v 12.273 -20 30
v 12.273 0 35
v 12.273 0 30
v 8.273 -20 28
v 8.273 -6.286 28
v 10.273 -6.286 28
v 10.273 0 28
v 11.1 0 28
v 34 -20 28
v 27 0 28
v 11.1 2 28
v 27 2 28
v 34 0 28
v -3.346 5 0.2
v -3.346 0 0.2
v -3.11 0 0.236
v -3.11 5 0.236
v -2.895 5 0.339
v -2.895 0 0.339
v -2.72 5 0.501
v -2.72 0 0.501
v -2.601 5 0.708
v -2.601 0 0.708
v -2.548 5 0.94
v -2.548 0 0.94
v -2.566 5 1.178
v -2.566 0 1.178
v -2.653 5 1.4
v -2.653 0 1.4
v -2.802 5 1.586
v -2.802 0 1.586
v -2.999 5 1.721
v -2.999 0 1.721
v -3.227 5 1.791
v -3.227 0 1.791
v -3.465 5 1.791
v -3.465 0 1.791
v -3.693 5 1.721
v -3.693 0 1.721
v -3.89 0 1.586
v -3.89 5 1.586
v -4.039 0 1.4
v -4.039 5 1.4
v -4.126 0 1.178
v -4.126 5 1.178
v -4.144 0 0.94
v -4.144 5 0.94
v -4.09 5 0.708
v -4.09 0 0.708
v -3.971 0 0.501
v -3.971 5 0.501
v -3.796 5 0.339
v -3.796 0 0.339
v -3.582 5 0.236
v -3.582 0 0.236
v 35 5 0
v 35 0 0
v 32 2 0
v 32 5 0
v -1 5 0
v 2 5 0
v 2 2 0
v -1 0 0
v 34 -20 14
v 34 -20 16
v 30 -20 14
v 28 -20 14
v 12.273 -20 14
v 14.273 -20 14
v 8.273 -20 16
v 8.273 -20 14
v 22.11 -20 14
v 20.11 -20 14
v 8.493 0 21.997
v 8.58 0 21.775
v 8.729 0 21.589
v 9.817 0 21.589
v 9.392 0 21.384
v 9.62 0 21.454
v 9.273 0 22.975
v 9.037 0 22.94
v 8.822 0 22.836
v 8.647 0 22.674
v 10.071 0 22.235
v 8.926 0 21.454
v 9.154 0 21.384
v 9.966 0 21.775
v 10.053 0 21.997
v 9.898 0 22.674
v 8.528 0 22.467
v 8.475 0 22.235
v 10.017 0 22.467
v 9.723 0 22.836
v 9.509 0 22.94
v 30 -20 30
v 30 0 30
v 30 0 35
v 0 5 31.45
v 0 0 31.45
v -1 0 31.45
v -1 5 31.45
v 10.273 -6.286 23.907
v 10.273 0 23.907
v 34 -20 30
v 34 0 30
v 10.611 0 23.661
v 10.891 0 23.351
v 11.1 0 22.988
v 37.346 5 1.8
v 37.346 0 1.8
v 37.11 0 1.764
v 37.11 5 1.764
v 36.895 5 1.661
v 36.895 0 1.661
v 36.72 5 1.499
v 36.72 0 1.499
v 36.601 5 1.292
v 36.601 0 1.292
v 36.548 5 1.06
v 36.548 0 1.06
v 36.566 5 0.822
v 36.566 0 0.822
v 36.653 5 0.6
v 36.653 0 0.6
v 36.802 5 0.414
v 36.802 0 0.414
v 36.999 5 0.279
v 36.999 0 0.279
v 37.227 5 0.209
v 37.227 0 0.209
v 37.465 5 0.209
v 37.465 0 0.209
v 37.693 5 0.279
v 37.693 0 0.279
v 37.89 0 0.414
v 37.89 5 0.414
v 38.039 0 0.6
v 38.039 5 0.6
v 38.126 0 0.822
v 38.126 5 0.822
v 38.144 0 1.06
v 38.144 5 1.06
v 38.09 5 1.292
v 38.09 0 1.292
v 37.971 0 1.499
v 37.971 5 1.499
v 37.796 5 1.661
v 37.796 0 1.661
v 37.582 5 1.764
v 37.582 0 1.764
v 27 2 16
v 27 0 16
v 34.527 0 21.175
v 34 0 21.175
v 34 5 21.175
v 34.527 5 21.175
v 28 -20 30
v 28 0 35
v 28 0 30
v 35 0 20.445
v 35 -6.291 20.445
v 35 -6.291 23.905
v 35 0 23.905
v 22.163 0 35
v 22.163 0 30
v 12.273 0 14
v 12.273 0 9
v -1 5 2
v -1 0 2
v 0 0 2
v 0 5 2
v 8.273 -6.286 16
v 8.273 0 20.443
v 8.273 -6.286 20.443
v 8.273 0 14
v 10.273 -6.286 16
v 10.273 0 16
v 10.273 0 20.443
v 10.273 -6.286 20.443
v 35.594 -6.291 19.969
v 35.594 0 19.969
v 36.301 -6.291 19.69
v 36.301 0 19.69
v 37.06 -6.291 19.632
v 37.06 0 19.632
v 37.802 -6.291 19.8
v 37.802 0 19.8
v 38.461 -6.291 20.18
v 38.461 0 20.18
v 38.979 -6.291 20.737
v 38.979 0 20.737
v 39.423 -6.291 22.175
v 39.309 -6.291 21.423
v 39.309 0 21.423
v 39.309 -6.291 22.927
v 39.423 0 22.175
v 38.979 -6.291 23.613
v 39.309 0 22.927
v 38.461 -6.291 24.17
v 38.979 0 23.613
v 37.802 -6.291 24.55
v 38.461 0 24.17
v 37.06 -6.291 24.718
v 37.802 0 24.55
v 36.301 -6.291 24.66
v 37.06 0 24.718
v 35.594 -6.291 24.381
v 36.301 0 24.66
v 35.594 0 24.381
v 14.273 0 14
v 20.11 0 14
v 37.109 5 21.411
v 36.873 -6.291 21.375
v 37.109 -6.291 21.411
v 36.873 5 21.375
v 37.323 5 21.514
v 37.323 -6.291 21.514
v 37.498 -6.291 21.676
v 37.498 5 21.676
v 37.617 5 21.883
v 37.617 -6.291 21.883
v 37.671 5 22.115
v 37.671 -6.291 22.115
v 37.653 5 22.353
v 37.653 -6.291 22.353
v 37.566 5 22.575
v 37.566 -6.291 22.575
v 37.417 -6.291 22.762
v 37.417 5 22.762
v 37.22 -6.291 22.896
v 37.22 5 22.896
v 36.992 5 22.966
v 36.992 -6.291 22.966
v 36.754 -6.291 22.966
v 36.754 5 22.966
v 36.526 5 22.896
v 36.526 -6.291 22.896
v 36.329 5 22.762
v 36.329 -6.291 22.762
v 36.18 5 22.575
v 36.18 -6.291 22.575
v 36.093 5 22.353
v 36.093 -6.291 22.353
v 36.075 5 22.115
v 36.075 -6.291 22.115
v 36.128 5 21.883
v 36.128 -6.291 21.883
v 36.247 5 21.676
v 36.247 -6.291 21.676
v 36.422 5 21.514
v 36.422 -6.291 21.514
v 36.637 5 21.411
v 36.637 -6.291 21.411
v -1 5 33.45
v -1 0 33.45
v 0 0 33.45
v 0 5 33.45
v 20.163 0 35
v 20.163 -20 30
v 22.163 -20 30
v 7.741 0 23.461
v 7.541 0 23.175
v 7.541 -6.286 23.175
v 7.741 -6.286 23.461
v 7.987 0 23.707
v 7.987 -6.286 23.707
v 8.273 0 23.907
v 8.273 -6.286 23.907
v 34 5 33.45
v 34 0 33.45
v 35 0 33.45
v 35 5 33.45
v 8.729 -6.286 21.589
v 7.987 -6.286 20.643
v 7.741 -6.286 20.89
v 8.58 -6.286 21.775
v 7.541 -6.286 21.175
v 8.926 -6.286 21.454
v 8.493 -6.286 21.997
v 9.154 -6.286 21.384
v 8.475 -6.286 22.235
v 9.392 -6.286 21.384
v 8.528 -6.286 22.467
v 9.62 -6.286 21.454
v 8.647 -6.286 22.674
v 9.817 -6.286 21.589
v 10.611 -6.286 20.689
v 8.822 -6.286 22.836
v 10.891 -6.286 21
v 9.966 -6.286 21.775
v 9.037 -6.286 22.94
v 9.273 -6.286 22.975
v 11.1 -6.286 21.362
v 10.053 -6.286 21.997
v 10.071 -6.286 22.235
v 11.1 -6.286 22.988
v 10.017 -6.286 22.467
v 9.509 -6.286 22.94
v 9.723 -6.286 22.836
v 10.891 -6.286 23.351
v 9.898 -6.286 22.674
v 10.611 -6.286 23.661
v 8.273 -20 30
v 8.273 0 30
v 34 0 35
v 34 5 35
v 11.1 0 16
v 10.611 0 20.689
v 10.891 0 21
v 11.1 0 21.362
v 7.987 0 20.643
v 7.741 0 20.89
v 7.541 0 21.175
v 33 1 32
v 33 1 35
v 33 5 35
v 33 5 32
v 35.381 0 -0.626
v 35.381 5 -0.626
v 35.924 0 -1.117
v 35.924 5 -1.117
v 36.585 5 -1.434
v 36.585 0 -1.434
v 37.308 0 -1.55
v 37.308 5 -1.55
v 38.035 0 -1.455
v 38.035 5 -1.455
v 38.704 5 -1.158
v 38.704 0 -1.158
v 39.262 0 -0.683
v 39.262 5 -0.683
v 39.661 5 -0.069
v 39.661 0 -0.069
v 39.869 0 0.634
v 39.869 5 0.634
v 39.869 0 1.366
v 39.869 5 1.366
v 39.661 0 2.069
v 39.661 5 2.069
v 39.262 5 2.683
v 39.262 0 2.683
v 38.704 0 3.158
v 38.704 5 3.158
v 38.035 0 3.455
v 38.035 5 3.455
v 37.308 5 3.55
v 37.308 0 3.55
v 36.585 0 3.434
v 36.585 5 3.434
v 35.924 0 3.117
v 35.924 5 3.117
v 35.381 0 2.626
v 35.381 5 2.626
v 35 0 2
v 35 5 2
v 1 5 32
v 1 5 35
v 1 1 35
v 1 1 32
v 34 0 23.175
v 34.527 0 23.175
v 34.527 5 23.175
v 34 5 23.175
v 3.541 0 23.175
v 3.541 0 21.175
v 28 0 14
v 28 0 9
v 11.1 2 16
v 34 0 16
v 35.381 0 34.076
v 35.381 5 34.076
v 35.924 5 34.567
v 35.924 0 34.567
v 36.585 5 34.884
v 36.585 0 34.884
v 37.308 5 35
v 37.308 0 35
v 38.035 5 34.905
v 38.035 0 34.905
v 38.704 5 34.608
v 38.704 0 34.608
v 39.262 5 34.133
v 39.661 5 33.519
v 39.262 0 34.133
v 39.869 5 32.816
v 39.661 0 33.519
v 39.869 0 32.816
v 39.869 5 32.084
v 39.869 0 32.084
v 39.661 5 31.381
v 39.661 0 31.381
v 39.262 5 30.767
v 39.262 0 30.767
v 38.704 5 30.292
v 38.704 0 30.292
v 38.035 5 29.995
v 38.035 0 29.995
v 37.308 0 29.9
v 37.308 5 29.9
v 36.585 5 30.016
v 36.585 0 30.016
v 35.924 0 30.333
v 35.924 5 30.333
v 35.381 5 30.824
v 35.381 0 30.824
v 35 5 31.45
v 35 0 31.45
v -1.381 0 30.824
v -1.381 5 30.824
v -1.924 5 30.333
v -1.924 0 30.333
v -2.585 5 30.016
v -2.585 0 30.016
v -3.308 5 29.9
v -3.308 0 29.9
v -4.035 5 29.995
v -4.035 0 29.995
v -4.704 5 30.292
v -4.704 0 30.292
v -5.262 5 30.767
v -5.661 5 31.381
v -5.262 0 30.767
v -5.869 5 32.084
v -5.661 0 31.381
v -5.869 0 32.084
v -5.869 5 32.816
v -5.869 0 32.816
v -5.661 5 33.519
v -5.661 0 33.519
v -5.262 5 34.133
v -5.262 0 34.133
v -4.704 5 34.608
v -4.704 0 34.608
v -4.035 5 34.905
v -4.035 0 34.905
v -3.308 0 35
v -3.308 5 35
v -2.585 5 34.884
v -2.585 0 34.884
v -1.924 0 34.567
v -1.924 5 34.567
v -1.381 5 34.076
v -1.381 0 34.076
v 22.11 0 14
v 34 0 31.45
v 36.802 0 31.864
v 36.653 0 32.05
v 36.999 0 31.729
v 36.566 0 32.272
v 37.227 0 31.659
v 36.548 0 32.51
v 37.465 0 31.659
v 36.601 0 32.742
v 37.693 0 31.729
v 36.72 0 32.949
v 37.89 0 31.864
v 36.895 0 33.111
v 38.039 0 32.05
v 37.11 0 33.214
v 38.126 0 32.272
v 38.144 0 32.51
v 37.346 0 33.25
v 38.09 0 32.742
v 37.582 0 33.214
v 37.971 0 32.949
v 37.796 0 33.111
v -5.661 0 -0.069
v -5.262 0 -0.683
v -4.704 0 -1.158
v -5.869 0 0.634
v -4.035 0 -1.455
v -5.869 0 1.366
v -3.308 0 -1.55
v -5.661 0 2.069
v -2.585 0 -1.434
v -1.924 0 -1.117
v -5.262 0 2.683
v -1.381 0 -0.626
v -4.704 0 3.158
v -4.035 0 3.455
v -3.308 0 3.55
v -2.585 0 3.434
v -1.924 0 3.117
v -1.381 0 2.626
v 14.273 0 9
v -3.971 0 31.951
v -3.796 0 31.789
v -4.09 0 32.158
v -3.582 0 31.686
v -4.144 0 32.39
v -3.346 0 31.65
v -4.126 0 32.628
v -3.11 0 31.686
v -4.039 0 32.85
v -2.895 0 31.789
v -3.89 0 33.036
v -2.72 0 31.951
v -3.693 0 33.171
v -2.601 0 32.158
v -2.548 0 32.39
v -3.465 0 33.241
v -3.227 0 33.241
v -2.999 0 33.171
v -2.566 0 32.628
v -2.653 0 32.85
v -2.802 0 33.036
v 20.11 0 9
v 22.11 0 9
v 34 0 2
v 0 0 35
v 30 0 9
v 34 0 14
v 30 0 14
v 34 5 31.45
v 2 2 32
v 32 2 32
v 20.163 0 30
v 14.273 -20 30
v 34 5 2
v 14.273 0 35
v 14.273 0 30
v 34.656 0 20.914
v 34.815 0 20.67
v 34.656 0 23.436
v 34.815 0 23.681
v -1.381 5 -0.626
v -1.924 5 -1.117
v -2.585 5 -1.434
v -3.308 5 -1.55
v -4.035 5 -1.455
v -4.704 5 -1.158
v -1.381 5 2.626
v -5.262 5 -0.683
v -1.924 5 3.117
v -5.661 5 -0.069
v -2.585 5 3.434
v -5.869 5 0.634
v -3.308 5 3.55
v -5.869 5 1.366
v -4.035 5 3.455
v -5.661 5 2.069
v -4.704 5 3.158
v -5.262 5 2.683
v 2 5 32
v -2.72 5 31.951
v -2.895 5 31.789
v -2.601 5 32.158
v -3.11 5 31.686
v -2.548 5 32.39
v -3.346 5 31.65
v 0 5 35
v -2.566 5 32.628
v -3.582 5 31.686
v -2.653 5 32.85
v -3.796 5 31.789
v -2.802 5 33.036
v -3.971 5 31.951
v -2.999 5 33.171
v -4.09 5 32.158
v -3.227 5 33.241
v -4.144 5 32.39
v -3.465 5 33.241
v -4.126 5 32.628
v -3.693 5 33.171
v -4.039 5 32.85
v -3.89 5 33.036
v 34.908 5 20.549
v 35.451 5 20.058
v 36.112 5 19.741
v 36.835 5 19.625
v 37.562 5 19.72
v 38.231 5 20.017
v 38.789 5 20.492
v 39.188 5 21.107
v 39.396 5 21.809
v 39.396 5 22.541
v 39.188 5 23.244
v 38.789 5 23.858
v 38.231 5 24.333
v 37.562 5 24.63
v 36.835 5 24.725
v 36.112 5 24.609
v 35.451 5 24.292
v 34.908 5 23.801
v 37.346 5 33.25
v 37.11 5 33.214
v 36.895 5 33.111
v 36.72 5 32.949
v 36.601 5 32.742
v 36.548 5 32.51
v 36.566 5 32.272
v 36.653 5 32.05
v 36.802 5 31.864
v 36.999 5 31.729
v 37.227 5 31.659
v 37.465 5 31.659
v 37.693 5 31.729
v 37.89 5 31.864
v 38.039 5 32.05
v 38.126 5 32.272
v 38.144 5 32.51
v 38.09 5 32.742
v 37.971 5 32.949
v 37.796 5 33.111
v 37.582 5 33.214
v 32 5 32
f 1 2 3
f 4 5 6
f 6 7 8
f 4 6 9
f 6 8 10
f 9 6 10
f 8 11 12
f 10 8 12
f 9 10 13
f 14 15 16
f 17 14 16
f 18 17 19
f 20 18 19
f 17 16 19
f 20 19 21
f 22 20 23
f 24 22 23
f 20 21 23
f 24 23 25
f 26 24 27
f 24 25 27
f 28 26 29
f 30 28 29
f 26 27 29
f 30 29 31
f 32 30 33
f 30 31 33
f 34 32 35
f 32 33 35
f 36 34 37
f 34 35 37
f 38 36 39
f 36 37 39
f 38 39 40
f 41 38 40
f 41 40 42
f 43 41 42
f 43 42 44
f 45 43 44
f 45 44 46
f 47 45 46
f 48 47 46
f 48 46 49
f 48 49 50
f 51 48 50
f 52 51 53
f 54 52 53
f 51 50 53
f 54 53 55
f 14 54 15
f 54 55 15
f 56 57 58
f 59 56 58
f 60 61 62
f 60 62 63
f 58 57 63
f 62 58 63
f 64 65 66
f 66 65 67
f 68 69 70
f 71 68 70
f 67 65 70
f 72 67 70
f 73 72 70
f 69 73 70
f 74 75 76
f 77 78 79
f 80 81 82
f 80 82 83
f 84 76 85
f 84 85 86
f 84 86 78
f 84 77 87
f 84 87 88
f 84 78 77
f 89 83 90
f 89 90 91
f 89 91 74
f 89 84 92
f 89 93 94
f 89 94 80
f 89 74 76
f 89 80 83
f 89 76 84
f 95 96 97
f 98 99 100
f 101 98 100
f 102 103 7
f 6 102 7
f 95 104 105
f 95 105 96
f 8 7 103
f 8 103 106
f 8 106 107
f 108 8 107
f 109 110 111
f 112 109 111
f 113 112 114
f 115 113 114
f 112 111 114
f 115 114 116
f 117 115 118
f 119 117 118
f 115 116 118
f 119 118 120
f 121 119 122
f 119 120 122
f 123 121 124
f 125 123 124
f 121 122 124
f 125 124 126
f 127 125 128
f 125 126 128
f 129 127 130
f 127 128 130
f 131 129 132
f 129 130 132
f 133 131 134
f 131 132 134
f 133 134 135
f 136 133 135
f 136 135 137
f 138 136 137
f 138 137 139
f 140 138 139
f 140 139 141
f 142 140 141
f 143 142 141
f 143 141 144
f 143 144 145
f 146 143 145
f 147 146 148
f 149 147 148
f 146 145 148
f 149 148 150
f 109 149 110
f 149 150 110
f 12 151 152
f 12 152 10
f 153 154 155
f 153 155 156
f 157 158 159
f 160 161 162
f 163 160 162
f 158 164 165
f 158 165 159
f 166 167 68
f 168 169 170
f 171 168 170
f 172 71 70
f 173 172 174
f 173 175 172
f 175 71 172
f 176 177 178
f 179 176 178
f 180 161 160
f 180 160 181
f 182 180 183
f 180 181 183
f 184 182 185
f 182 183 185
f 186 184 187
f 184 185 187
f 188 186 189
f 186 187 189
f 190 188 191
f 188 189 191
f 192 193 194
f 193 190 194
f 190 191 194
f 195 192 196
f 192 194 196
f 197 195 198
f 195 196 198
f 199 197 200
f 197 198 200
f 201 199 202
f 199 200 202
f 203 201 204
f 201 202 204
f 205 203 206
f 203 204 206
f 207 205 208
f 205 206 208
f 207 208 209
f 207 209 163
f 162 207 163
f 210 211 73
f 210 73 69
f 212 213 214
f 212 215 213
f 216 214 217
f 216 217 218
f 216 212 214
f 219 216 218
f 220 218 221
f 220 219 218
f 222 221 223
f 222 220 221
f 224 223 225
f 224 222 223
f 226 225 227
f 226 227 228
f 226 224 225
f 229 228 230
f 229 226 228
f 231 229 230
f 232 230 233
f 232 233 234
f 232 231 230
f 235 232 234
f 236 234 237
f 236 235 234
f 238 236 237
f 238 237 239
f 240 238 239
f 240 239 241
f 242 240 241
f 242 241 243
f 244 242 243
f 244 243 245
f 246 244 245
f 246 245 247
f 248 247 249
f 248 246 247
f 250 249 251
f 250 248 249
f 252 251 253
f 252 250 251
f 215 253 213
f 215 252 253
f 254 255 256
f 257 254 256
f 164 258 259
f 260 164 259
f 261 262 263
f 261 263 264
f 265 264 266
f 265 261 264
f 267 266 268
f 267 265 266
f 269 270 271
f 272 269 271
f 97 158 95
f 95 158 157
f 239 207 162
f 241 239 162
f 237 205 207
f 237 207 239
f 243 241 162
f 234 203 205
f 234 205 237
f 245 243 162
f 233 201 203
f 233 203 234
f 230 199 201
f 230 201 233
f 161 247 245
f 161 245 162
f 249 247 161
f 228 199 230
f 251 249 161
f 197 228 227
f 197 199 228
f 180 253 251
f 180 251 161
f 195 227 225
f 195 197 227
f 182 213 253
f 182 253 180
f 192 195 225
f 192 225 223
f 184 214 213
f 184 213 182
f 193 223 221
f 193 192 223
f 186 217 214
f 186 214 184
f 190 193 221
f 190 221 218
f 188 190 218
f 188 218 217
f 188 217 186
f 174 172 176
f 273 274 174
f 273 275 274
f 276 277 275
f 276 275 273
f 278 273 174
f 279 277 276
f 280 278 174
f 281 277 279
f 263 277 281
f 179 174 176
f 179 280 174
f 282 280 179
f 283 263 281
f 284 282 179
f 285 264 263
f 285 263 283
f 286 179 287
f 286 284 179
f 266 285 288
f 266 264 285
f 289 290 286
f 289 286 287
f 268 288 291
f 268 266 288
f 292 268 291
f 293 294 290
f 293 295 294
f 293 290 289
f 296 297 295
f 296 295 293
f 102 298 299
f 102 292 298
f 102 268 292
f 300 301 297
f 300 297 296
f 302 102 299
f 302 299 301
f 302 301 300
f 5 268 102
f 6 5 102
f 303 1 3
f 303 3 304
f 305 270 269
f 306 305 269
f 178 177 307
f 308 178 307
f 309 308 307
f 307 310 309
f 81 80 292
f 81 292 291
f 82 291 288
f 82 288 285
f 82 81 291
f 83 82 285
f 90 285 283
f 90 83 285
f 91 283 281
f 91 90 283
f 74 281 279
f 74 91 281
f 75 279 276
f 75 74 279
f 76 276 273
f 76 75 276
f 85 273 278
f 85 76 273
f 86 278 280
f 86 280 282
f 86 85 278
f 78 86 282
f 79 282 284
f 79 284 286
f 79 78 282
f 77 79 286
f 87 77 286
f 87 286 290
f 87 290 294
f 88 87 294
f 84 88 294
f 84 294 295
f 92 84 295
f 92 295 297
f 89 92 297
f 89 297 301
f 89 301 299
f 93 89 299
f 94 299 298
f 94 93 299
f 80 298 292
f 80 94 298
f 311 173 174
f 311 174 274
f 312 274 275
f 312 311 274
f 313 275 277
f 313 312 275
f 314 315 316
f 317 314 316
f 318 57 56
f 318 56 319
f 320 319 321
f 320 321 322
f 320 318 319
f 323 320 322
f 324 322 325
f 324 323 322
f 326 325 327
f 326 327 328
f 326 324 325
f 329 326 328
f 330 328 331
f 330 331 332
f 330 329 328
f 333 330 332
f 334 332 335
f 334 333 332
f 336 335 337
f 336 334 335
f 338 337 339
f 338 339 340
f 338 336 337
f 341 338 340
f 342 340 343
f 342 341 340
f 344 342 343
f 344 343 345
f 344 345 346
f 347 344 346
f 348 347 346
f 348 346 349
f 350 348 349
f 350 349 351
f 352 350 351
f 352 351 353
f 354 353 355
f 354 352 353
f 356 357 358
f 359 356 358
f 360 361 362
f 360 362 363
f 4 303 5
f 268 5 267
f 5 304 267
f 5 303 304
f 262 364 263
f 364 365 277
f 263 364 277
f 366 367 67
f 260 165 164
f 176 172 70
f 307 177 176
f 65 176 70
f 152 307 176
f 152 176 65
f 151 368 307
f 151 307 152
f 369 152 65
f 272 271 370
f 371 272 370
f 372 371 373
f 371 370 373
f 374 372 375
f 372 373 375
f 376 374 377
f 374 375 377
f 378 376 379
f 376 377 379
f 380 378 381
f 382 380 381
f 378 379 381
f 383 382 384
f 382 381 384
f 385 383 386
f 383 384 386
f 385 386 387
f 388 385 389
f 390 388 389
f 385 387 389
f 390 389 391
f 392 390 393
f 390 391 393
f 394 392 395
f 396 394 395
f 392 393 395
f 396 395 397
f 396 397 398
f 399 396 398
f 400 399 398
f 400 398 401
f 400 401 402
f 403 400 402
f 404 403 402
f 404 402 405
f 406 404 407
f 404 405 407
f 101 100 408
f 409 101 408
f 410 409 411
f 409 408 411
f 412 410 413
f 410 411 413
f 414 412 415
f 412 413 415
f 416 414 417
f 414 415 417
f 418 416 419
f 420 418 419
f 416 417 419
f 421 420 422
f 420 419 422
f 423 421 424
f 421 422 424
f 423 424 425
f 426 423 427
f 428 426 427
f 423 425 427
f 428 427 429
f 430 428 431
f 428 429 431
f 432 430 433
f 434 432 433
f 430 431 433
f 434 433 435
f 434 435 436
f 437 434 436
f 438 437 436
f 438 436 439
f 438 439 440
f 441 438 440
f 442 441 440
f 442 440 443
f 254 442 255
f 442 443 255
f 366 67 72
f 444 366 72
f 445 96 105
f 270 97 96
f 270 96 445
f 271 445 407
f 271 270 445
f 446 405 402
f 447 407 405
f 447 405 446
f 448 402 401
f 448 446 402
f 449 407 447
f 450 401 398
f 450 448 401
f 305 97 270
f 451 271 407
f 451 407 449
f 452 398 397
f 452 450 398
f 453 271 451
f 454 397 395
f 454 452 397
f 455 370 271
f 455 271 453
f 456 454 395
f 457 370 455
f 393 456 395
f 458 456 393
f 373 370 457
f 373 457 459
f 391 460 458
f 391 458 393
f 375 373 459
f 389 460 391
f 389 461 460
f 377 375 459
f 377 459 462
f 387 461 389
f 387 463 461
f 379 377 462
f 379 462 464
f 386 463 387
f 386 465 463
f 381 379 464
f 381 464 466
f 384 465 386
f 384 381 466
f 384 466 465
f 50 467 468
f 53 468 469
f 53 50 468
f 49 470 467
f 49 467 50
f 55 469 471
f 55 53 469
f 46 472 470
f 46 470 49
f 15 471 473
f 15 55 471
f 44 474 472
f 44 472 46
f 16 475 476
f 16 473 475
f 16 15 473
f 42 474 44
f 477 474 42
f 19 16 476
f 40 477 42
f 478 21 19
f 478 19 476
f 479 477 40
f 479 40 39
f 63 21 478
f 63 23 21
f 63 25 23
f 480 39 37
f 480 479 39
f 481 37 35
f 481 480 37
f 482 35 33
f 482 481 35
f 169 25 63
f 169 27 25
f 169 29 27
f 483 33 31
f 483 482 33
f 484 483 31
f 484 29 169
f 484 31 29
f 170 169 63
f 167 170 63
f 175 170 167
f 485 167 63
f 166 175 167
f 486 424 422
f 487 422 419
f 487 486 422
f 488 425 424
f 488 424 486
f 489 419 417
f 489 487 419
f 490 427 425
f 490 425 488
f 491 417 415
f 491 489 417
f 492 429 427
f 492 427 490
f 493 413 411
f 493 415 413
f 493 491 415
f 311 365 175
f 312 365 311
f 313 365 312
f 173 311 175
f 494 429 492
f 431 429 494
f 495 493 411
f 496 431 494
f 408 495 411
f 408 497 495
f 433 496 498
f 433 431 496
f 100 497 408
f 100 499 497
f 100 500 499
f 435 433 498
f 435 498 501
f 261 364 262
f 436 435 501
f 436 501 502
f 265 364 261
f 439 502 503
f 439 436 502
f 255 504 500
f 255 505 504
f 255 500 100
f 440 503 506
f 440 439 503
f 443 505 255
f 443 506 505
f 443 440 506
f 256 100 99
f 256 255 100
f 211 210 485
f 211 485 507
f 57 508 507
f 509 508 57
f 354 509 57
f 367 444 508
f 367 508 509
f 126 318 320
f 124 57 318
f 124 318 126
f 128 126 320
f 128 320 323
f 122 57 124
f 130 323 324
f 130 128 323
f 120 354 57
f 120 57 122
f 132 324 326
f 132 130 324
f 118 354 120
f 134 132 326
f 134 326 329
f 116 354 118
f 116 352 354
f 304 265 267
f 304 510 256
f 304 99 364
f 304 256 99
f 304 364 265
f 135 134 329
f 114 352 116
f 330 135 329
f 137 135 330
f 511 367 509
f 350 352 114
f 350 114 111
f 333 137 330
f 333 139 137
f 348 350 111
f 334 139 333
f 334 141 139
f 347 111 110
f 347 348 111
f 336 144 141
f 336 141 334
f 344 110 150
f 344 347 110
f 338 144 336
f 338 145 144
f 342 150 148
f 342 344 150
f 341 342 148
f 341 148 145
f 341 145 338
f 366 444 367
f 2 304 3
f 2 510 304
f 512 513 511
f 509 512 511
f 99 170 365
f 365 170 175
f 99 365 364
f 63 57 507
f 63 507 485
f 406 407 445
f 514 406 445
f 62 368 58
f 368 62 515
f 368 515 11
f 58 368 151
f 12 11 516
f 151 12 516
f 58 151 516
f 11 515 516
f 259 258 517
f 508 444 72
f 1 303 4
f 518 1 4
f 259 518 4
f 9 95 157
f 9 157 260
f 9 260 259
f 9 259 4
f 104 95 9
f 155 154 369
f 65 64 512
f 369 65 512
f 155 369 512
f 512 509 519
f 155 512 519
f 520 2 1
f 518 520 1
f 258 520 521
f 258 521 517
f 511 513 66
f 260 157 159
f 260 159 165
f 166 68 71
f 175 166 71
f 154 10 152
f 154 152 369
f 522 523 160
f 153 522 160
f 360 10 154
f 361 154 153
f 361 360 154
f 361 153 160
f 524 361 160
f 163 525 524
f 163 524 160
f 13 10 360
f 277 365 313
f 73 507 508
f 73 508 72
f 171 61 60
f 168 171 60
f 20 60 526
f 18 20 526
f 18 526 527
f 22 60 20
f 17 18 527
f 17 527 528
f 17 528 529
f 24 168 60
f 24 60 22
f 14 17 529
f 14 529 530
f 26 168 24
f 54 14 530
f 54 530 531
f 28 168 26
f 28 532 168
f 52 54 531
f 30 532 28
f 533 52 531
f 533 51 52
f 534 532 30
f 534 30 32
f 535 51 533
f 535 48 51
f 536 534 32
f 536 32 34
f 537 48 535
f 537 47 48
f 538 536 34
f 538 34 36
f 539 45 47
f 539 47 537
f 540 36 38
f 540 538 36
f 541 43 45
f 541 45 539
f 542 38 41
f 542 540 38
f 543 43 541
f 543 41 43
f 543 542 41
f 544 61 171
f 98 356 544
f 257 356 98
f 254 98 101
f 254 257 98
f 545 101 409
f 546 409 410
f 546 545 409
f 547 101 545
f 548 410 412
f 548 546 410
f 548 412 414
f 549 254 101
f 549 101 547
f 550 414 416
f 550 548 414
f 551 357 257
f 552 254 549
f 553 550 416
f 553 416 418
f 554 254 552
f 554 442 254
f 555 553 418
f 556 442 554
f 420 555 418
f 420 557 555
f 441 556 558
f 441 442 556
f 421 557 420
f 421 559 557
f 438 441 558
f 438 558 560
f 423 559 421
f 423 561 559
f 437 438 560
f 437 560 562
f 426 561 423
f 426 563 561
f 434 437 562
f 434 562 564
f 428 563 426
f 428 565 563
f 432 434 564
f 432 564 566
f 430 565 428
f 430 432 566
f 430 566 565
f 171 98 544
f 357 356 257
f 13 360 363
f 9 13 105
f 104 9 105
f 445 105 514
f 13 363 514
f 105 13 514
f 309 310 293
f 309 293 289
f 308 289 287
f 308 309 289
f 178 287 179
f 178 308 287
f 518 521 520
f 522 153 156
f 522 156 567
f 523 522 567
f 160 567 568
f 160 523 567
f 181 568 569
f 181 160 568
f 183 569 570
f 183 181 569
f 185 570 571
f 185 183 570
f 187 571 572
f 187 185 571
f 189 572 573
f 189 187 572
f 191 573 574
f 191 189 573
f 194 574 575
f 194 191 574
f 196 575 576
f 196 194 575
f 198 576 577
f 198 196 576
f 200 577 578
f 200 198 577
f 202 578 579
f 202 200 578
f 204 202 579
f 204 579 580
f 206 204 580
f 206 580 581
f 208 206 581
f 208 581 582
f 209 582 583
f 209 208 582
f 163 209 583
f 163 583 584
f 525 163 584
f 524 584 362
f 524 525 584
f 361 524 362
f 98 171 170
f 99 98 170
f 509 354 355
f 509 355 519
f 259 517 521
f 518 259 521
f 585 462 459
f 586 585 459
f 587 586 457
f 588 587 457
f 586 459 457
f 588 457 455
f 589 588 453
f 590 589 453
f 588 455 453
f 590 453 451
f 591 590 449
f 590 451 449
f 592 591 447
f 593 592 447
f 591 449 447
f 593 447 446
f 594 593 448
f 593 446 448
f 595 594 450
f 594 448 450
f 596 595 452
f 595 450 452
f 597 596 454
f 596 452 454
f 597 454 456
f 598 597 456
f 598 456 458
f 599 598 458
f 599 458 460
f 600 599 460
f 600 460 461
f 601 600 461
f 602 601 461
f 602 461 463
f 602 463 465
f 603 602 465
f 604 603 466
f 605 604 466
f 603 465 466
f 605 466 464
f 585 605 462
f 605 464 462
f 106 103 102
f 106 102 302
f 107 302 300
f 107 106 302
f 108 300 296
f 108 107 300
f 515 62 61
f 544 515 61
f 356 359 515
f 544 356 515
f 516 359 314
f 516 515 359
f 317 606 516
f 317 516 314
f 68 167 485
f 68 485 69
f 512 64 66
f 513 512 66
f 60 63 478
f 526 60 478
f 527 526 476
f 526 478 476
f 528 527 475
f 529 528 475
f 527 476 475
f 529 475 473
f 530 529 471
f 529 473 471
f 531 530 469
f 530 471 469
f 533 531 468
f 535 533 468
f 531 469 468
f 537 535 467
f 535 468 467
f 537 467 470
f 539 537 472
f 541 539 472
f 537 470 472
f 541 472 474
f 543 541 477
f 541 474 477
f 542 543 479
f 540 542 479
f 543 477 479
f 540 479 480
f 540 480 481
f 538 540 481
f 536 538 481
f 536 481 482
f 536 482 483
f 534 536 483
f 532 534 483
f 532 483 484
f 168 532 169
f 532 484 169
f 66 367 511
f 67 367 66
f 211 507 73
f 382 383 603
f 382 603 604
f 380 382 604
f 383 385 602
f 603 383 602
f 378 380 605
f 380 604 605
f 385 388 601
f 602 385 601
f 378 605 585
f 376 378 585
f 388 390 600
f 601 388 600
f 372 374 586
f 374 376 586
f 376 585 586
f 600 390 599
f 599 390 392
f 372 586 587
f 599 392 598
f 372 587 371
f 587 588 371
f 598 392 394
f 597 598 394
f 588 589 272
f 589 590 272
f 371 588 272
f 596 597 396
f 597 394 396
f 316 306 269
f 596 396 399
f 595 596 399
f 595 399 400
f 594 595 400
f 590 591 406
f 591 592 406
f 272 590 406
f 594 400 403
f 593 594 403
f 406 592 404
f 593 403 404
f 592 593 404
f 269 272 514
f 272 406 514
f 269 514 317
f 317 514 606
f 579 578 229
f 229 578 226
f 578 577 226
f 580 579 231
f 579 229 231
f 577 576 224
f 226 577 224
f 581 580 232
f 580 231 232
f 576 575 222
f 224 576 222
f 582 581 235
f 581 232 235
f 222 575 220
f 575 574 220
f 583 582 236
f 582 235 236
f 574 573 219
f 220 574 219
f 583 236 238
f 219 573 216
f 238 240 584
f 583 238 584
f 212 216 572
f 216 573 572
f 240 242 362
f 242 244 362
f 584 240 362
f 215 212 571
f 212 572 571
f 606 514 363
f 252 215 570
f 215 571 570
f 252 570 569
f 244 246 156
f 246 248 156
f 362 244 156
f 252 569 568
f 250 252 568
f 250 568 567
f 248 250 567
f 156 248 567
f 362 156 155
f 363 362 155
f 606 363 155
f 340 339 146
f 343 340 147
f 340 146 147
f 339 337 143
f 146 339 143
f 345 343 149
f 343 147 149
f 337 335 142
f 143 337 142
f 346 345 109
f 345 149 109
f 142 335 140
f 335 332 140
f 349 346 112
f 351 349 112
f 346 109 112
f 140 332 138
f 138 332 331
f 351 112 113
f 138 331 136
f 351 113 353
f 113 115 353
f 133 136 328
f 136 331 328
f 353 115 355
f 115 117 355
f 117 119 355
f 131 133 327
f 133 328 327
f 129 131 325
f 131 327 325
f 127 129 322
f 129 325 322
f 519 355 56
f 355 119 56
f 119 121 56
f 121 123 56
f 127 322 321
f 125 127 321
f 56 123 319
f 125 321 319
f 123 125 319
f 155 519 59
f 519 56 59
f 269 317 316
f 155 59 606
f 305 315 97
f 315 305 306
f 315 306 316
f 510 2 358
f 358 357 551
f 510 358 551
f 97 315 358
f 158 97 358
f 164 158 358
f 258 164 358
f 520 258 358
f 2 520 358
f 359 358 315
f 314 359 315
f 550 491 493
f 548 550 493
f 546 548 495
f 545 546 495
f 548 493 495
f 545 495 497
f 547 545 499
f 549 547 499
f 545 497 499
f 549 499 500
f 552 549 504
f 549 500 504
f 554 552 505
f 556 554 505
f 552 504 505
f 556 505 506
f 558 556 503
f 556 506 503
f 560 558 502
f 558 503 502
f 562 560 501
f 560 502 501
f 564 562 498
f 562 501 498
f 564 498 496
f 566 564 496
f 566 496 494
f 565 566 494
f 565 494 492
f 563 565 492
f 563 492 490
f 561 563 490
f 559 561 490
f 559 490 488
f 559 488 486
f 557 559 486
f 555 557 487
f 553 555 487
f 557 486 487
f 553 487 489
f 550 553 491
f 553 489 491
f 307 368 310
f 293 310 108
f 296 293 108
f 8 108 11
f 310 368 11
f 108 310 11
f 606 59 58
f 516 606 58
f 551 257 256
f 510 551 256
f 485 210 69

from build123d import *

# Parameters (mm, degrees)
BOSS_EXTRU_1_DEPTH       = 35
ENL_V_MAT_EXTRU_1_DEPTH  = 3
ENL_V_START              = -2
ESQUISSE3_W              = 14
ESQUISSE3_H              = 12
ENL_V_MAT_EXTRU_2_DEPTH  = 2
ESQUISSE7_W              = 3
ESQUISSE7_H              = 12
ENL_V_MAT_EXTRU_4_DEPTH  = 2
BOSS_EXTRU_4_START       = -2
ESQUISSE9_W              = 1.1
ESQUISSE9_H              = 12
BOSS_EXTRU_4_DEPTH       = 2
ESQUISSE10_R             = 0.8
BOSS_EXTRU_5_DEPTH       = 6.285817
ESQUISSE19_W             = 2
ESQUISSE19_H             = 4.092832792
ESQUISSE19_H_2           = 4.443065592
ESQUISSE19_W_2           = 4
ESQUISSE19_H_3           = 2
BOSS_EXTRU_8_DEPTH       = 6.285817
ENL_V_MAT_EXTRU_9_DEPTH  = 2
ESQUISSE25_R             = 0.8
BOSS_EXTRU_10_DEPTH      = 5
ESQUISSE26_R             = 0.8
BOSS_EXTRU_11_DEPTH      = 5
ESQUISSE27_R             = 0.8
BOSS_EXTRU_12_DEPTH      = 5
ESQUISSE28_R             = 2.55
ESQUISSE28_R_2           = 0.8
BOSS_EXTRU_13_DEPTH      = 6.290743
ENL_V_START_2            = -6.290743
ESQUISSE29_W             = 1.350487441
ESQUISSE29_H             = 4.654500935
ENL_V_MAT_EXTRU_11_DEPTH = 6.290743
BOSS_EXTRU_14_DEPTH      = 20
ENL_V_START_3            = -17.727203
ENL_V_MAT_EXTRU_12_DEPTH = 17.727203


with BuildPart() as part:
    # Esquisse1 → Boss.-Extru.1 (new body)
    with BuildSketch(Plane.XY):
        Polygon((0, 0), (34, 0), (34, 5), (32, 5), (32, 2), (2, 2), (2, 5), (0, 5), align=None)
    extrude(amount=BOSS_EXTRU_1_DEPTH)

    # Esquisse2 → Enl_v. mat.-Extru.1 (cut)
    with BuildSketch(Plane.XY.offset(35)):
        Polygon((2, 5), (1, 5), (1, 1), (33, 1), (33, 5), (32, 5), (32, 2), (2, 2), align=None)
    extrude(amount=-ENL_V_MAT_EXTRU_1_DEPTH, mode=Mode.SUBTRACT)

    # Esquisse3 → Enl_v. mat.-Extru.2 (cut)
    with BuildSketch(Plane(origin=(0, 2, 0), x_dir=(1, 0, 0), z_dir=(0, 1, 0)).offset(ENL_V_START)):
        with Locations((17, -22)):
            Rectangle(ESQUISSE3_W, ESQUISSE3_H)
    extrude(amount=ENL_V_MAT_EXTRU_2_DEPTH, mode=Mode.SUBTRACT)

    # Esquisse7 → Enl_v. mat.-Extru.4 (cut)
    with BuildSketch(Plane.XZ.offset(ENL_V_START)):
        with Locations((25.5, 22)):
            Rectangle(ESQUISSE7_W, ESQUISSE7_H)
    extrude(amount=ENL_V_MAT_EXTRU_4_DEPTH, mode=Mode.SUBTRACT)

    # Esquisse9 → Boss.-Extru.4 (add)
    with BuildSketch(Plane.XZ.offset(BOSS_EXTRU_4_START)):
        with Locations((10.55, 22)):
            Rectangle(ESQUISSE9_W, ESQUISSE9_H)
    extrude(amount=BOSS_EXTRU_4_DEPTH)

    # Esquisse10 → Boss.-Extru.5 (add)
    with BuildSketch(Plane.XZ):
        with BuildLine():
            Line((11.1, 22.988338073), (11.1, 21.361894727))
            ThreePointArc((11.1, 21.361894727), (7.27279708, 22.1751164), (11.1, 22.988338073))
        make_face()
        with Locations(Location((9.27279708, 22.1751164, 0), (0, 0, 90))):
            Circle(ESQUISSE10_R, mode=Mode.SUBTRACT)
    extrude(amount=BOSS_EXTRU_5_DEPTH)

    # Esquisse19 → Boss.-Extru.8 (add)
    with BuildSketch(Plane.XZ):
        with Locations((9.27279708, 25.953583604)):
            Rectangle(ESQUISSE19_W, ESQUISSE19_H)
        with Locations((9.27279708, 18.221532796)):
            Rectangle(ESQUISSE19_W, ESQUISSE19_H_2)
        with Locations((5.540746272, 22.1751164)):
            Rectangle(ESQUISSE19_W_2, ESQUISSE19_H_3)
    extrude(amount=BOSS_EXTRU_8_DEPTH)

    # Esquisse21 → Enl_v. mat.-Extru.9 (cut)
    with BuildSketch(Plane(origin=(0, 0, 21.1751164), x_dir=(-1, 0, 0), z_dir=(0, 0, -1))):
        Polygon((-3.540746272, 0), (-7.540746272, -6.285817331), (-3.540746272, -6.285817331), align=None)
    extrude(amount=-ENL_V_MAT_EXTRU_9_DEPTH, mode=Mode.SUBTRACT)

    # Esquisse25 → Boss.-Extru.10 (add)
    with BuildSketch(Plane.XZ):
        with BuildLine():
            Line((0, 31.45), (-1, 31.45))
            ThreePointArc((-1, 31.45), (-5.895740821, 32.45), (-1, 33.45))
            Line((-1, 33.45), (0, 33.45))
            Line((0, 33.45), (0, 31.45))
        make_face()
        with Locations(Location((-3.345740821, 32.45, 0), (0, 0, 270))):
            Circle(ESQUISSE25_R, mode=Mode.SUBTRACT)
        with BuildLine():
            Line((34, 33.45), (35, 33.45))
            ThreePointArc((35, 33.45), (39.895740821, 32.45), (35, 31.45))
            Line((35, 31.45), (34, 31.45))
            Line((34, 31.45), (34, 33.45))
        make_face()
        with Locations(Location((37.345740821, 32.45, 0), (0, 0, 90))):
            Circle(ESQUISSE25_R, mode=Mode.SUBTRACT)
    extrude(amount=-BOSS_EXTRU_10_DEPTH)

    # Esquisse26 → Boss.-Extru.11 (add)
    with BuildSketch(Plane.XZ):
        with BuildLine():
            Line((-1, 2), (0, 2))
            Line((0, 2), (0, 0))
            Line((0, 0), (-1, 0))
            ThreePointArc((-1, 0), (-5.895740821, 1), (-1, 2))
        make_face()
        with Locations(Location((-3.345740821, 1, 0), (0, 0, 270))):
            Circle(ESQUISSE26_R, mode=Mode.SUBTRACT)
        with BuildLine():
            Line((34, 2), (34, 0))
            Line((34, 0), (35, 0))
            ThreePointArc((35, 0), (39.895740821, 1), (35, 2))
            Line((35, 2), (34, 2))
        make_face()
        with Locations(Location((37.345740821, 1, 0), (0, 0, 90))):
            Circle(ESQUISSE26_R, mode=Mode.SUBTRACT)
    extrude(amount=-BOSS_EXTRU_11_DEPTH)

    # Esquisse27 → Boss.-Extru.12 (add)
    with BuildSketch(Plane(origin=(0, 0, 0), x_dir=(-1, 0, 0), z_dir=(0, -1, 0))):
        with BuildLine():
            Line((-34, -21.1751164), (-34.527056259, -21.1751164))
            ThreePointArc((-34.527056259, -21.1751164), (-39.42279708, -22.1751164), (-34.527056259, -23.1751164))
            Line((-34.527056259, -23.1751164), (-34, -23.1751164))
            Line((-34, -23.1751164), (-34, -21.1751164))
        make_face()
        with Locations(Location((-36.87279708, -22.1751164, 0), (0, 0, 90))):
            Circle(ESQUISSE27_R, mode=Mode.SUBTRACT)
    extrude(amount=-BOSS_EXTRU_12_DEPTH)

    # Esquisse28 → Boss.-Extru.13 (add)
    with BuildSketch(Plane.XZ):
        with Locations(Location((36.87279708, 22.1751164, 0), (0, 0, 270))):
            Circle(ESQUISSE28_R)
        with Locations(Location((36.87279708, 22.1751164, 0), (0, 0, 270))):
            Circle(ESQUISSE28_R_2, mode=Mode.SUBTRACT)
    extrude(amount=BOSS_EXTRU_13_DEPTH)

    # Esquisse29 → Enl_v. mat.-Extru.11 (cut)
    with BuildSketch(Plane.XZ.offset(6.290743087).offset(ENL_V_START_2)):
        with Locations((34.324427693, 22.303512705)):
            Rectangle(ESQUISSE29_W, ESQUISSE29_H)
    extrude(amount=ENL_V_MAT_EXTRU_11_DEPTH, mode=Mode.SUBTRACT)

    # Esquisse30 → Boss.-Extru.14 (add)
    with BuildSketch(Plane.XZ):
        Polygon((8.27279708, 28), (34, 28), (34, 30), (30, 30), (30, 35), (28, 35), (28, 30), (22.16279708, 30), (22.16279708, 35), (20.16279708, 35), (20.16279708, 30), (14.27279708, 30), (14.27279708, 35), (12.27279708, 35), (12.27279708, 30), (8.27279708, 30), align=None)
        Polygon((8.27279708, 16), (34, 16), (34, 14), (30, 14), (30, 9), (28, 9), (28, 14), (22.11, 14), (22.11, 9), (20.11, 9), (20.11, 14), (14.27279708, 14), (14.27279708, 9), (12.27279708, 9), (12.27279708, 14), (8.27279708, 14), align=None)
    extrude(amount=BOSS_EXTRU_14_DEPTH)

    # Esquisse31 → Enl_v. mat.-Extru.12 (cut)
    with BuildSketch(Plane(origin=(30, 0, 0), x_dir=(0, 0, -1), z_dir=(1, 0, 0)).offset(ENL_V_START_3)):
        Polygon((-35, 0), (-30, -20), (-35, -20), align=None)
        Polygon((-9, 0), (-14, -20), (-9, -20), align=None)
    extrude(amount=ENL_V_MAT_EXTRU_12_DEPTH, mode=Mode.SUBTRACT)


solid = part.part
